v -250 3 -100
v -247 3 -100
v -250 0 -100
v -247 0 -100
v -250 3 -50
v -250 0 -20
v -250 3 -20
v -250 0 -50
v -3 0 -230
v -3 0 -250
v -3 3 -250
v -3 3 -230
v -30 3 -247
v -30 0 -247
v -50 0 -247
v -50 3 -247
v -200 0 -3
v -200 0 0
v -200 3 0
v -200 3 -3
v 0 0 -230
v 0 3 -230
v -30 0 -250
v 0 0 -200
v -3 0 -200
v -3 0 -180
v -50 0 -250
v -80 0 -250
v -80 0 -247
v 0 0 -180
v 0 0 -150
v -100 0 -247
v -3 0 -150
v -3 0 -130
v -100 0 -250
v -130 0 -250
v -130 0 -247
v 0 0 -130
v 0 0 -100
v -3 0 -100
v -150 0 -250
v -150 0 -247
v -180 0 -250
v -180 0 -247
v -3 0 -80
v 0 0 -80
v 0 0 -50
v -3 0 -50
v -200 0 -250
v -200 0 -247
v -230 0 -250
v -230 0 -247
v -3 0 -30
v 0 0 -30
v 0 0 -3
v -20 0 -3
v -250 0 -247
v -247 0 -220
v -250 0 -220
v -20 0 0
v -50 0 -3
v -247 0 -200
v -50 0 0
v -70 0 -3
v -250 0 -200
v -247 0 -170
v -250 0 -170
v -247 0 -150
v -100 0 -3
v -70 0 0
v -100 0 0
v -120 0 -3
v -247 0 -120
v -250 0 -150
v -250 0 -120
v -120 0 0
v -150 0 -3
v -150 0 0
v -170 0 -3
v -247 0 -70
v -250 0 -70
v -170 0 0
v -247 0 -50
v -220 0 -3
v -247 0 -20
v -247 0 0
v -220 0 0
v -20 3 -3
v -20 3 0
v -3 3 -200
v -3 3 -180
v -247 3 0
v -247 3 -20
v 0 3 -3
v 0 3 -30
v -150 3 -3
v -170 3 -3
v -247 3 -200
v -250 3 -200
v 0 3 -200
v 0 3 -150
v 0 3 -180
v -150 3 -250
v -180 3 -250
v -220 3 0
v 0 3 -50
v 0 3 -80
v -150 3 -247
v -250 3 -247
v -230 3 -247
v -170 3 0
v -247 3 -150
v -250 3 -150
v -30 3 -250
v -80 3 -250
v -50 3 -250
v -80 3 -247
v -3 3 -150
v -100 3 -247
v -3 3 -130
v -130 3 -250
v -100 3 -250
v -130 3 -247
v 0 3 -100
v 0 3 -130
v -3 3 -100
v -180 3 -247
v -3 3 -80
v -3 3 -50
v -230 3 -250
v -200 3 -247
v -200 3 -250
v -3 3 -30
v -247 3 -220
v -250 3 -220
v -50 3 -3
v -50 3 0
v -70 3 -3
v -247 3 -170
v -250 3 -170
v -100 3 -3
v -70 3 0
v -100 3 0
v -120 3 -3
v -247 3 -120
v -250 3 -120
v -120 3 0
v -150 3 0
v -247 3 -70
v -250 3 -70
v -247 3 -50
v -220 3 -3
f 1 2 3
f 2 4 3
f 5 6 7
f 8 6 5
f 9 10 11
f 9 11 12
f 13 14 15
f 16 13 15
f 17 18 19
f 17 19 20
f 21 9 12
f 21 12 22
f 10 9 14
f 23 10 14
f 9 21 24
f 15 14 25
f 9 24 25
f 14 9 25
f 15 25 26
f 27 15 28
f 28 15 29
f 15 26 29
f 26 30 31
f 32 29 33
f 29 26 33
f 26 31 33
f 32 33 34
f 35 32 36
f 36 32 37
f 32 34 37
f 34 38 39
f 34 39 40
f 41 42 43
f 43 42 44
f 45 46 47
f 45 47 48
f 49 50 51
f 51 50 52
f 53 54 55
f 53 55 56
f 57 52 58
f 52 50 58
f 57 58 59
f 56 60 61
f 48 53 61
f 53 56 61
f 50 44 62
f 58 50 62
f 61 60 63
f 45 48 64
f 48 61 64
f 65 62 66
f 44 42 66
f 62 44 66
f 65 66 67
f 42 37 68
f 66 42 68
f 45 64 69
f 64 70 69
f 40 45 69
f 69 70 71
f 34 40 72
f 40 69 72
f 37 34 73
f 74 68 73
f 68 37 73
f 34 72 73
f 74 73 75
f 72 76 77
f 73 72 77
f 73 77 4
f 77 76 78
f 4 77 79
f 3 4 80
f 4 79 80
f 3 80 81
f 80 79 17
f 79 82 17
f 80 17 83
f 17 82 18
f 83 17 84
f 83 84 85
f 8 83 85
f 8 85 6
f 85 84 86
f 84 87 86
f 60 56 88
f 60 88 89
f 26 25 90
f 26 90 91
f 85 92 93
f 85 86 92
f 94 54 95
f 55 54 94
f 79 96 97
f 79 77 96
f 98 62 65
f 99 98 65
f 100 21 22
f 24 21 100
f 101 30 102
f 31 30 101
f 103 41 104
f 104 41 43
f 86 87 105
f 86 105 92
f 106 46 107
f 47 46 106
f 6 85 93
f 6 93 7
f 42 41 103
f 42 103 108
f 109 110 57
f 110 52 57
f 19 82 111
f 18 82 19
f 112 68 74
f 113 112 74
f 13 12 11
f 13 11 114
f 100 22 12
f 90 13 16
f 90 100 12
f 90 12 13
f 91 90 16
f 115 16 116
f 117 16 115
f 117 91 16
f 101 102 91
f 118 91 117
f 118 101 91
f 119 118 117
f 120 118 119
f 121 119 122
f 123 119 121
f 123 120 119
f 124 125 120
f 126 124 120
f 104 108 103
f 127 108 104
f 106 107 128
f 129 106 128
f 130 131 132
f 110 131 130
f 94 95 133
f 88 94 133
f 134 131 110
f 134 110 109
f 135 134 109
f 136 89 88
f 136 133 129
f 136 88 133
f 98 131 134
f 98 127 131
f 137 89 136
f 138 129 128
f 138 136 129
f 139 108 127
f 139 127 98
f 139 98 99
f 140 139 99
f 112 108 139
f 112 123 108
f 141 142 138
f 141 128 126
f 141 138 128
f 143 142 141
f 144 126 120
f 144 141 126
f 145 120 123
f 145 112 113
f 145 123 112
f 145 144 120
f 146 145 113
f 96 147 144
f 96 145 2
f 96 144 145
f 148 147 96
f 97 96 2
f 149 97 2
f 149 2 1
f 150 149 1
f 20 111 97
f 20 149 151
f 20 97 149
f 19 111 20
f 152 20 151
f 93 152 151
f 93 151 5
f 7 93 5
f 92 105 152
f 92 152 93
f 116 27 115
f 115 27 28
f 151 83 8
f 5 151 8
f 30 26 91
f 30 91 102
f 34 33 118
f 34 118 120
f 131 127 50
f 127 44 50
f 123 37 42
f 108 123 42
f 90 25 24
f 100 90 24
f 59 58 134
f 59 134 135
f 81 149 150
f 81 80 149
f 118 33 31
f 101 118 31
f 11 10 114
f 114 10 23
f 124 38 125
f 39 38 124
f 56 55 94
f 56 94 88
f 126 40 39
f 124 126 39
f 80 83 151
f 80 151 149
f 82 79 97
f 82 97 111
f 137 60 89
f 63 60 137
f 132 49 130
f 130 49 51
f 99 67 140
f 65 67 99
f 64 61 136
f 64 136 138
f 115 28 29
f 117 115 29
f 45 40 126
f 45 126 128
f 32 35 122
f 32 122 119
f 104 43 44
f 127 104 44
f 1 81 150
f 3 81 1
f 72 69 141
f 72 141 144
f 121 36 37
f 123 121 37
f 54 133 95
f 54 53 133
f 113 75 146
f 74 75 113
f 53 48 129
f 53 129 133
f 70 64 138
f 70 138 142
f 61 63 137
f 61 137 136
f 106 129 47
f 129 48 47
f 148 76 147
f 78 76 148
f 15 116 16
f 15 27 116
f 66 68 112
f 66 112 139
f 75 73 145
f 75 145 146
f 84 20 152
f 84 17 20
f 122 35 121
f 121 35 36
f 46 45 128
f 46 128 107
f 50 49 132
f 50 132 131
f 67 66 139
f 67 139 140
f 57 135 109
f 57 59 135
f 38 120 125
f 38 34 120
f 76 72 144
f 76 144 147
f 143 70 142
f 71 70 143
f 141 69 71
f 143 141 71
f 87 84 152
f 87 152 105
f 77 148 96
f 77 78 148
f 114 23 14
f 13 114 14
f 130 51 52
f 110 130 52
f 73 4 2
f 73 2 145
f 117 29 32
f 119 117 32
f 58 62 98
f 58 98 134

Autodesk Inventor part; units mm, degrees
ref_plane "YZ Plane" through (0, 0, 0) normal (1, 0, 0) x (0, 1, 0)
ref_plane "XZ Plane" through (0, 0, 0) normal (0, 1, 0) x (-1, 0, 0)
ref_plane "XY Plane" through (0, 0, 0) normal (0, 0, 1) x (1, 0, 0)
sketch "Sketch1" plane through (0, 0, 0) normal (0, 1, 0) x (-1, 0, 0)
  line L0 (247, 0) -> (247, -20)
  line L1 (247, -20) -> (250, -20)
  line L2 (247, -50) -> (247, -70)
  line L3 (247, -70) -> (250, -70)
  line L4 (247, -50) -> (250, -50)
  line L5 (250, -20) -> (250, -50)
  line L6 (247, -100) -> (247, -120)
  line L7 (247, -150) -> (247, -170)
  line L8 (247, -200) -> (247, -220)
  line L9 (247, -220) -> (250, -220)
  line L10 (247, -200) -> (250, -200)
  line L11 (247, -170) -> (250, -170)
  line L12 (247, -150) -> (250, -150)
  line L13 (247, -120) -> (250, -120)
  line L14 (247, -100) -> (250, -100)
  line L15 (250, -220) -> (250, -247)
  line L16 (250, -170) -> (250, -200)
  line L17 (250, -70) -> (250, -100)
  line L18 (250, -120) -> (250, -150)
  line L19 (3, -250) -> (3, -230)
  line L20 (3, -230) -> (0, -230)
  line L21 (3, -200) -> (3, -180)
  line L22 (3, -180) -> (0, -180)
  line L23 (3, -200) -> (0, -200)
  line L24 (0, -230) -> (0, -200)
  line L25 (3, -150) -> (3, -130)
  line L26 (3, -100) -> (3, -80)
  line L27 (3, -50) -> (3, -30)
  line L28 (3, -30) -> (0, -30)
  line L29 (3, -50) -> (0, -50)
  line L30 (3, -80) -> (0, -80)
  line L31 (3, -100) -> (0, -100)
  line L32 (3, -130) -> (0, -130)
  line L33 (3, -150) -> (0, -150)
  line L34 (0, -30) -> (0, -3)
  line L35 (0, -80) -> (0, -50)
  line L36 (0, -180) -> (0, -150)
  line L37 (0, -130) -> (0, -100)
  line L38 (130, -247) -> (150, -247)
  line L39 (150, -250) -> (150, -247)
  line L40 (150, -250) -> (180, -250)
  line L41 (180, -250) -> (180, -247)
  line L42 (200, -250) -> (200, -247)
  line L43 (180, -247) -> (200, -247)
  line L44 (200, -250) -> (230, -250)
  line L45 (230, -250) -> (230, -247)
  line L46 (230, -247) -> (250, -247)
  line L47 (3, -250) -> (30, -250)
  line L48 (30, -250) -> (30, -247)
  line L49 (130, -250) -> (130, -247)
  line L50 (100, -250) -> (130, -250)
  line L51 (100, -250) -> (100, -247)
  line L52 (80, -247) -> (100, -247)
  line L53 (80, -250) -> (80, -247)
  line L54 (50, -250) -> (80, -250)
  line L55 (50, -250) -> (50, -247)
  line L56 (30, -247) -> (50, -247)
  line L57 (230, -250) -> (200, -250)
  line L58 (180, -250) -> (150, -250)
  line L59 (130, -250) -> (100, -250)
  line L60 (80, -250) -> (50, -250)
  line L61 (30, -250) -> (3, -250)
  line L62 (0, -3) -> (20, -3)
  line L63 (20, -3) -> (20, 0)
  line L64 (50, 0) -> (50, -3)
  line L65 (50, -3) -> (70, -3)
  line L66 (70, -3) -> (70, 0)
  line L67 (100, -3) -> (100, 0)
  line L68 (100, -3) -> (120, -3)
  line L69 (120, -3) -> (120, 0)
  line L70 (150, 0) -> (150, -3)
  line L71 (150, -3) -> (170, -3)
  line L72 (170, -3) -> (170, 0)
  line L73 (200, 0) -> (200, 0)
  line L74 (200, 0) -> (200, -3)
  line L75 (200, -3) -> (220, -3)
  line L76 (220, -3) -> (220, 0)
  line L77 (220, 0) -> (247, 0)
  line L78 (170, 0) -> (200, 0)
  line L79 (120, 0) -> (150, 0)
  line L80 (20, 0) -> (50, 0)
  line L81 (70, 0) -> (100, 0)
  point P0 (0, 0)
  dimension "d11" = 20
  dimension "d12" = 20
  dimension "d13" = 20
  dimension "d14" = 20
  dimension "d15" = 20
  dimension "d16" = 20
  dimension "d17" = 20
  dimension "d18" = 20
  dimension "d19" = 30
  dimension "d20" = 30
  dimension "d21" = 30
  dimension "d22" = 30
  dimension "d27" = 20
  dimension "d28" = 3
  dimension "d30" = 20
  dimension "d31" = 3
  dimension "d32" = 20
  dimension "d33" = 20
  dimension "d34" = 3
  dimension "d35" = 20
  dimension "d36" = 3
  dimension "d37" = 20
  dimension "d38" = 30
  dimension "d39" = 30
  dimension "d40" = 250
  dimension "d41" = 20
  dimension "d42" = 20
  dimension "d43" = 20
  dimension "d44" = 20
  dimension "d45" = 20
  dimension "d46" = 20
  dimension "d47" = 27
extrude "Extrusion1" add sketch "Sketch1" along normal blind 3
properties part number "Bbase"
